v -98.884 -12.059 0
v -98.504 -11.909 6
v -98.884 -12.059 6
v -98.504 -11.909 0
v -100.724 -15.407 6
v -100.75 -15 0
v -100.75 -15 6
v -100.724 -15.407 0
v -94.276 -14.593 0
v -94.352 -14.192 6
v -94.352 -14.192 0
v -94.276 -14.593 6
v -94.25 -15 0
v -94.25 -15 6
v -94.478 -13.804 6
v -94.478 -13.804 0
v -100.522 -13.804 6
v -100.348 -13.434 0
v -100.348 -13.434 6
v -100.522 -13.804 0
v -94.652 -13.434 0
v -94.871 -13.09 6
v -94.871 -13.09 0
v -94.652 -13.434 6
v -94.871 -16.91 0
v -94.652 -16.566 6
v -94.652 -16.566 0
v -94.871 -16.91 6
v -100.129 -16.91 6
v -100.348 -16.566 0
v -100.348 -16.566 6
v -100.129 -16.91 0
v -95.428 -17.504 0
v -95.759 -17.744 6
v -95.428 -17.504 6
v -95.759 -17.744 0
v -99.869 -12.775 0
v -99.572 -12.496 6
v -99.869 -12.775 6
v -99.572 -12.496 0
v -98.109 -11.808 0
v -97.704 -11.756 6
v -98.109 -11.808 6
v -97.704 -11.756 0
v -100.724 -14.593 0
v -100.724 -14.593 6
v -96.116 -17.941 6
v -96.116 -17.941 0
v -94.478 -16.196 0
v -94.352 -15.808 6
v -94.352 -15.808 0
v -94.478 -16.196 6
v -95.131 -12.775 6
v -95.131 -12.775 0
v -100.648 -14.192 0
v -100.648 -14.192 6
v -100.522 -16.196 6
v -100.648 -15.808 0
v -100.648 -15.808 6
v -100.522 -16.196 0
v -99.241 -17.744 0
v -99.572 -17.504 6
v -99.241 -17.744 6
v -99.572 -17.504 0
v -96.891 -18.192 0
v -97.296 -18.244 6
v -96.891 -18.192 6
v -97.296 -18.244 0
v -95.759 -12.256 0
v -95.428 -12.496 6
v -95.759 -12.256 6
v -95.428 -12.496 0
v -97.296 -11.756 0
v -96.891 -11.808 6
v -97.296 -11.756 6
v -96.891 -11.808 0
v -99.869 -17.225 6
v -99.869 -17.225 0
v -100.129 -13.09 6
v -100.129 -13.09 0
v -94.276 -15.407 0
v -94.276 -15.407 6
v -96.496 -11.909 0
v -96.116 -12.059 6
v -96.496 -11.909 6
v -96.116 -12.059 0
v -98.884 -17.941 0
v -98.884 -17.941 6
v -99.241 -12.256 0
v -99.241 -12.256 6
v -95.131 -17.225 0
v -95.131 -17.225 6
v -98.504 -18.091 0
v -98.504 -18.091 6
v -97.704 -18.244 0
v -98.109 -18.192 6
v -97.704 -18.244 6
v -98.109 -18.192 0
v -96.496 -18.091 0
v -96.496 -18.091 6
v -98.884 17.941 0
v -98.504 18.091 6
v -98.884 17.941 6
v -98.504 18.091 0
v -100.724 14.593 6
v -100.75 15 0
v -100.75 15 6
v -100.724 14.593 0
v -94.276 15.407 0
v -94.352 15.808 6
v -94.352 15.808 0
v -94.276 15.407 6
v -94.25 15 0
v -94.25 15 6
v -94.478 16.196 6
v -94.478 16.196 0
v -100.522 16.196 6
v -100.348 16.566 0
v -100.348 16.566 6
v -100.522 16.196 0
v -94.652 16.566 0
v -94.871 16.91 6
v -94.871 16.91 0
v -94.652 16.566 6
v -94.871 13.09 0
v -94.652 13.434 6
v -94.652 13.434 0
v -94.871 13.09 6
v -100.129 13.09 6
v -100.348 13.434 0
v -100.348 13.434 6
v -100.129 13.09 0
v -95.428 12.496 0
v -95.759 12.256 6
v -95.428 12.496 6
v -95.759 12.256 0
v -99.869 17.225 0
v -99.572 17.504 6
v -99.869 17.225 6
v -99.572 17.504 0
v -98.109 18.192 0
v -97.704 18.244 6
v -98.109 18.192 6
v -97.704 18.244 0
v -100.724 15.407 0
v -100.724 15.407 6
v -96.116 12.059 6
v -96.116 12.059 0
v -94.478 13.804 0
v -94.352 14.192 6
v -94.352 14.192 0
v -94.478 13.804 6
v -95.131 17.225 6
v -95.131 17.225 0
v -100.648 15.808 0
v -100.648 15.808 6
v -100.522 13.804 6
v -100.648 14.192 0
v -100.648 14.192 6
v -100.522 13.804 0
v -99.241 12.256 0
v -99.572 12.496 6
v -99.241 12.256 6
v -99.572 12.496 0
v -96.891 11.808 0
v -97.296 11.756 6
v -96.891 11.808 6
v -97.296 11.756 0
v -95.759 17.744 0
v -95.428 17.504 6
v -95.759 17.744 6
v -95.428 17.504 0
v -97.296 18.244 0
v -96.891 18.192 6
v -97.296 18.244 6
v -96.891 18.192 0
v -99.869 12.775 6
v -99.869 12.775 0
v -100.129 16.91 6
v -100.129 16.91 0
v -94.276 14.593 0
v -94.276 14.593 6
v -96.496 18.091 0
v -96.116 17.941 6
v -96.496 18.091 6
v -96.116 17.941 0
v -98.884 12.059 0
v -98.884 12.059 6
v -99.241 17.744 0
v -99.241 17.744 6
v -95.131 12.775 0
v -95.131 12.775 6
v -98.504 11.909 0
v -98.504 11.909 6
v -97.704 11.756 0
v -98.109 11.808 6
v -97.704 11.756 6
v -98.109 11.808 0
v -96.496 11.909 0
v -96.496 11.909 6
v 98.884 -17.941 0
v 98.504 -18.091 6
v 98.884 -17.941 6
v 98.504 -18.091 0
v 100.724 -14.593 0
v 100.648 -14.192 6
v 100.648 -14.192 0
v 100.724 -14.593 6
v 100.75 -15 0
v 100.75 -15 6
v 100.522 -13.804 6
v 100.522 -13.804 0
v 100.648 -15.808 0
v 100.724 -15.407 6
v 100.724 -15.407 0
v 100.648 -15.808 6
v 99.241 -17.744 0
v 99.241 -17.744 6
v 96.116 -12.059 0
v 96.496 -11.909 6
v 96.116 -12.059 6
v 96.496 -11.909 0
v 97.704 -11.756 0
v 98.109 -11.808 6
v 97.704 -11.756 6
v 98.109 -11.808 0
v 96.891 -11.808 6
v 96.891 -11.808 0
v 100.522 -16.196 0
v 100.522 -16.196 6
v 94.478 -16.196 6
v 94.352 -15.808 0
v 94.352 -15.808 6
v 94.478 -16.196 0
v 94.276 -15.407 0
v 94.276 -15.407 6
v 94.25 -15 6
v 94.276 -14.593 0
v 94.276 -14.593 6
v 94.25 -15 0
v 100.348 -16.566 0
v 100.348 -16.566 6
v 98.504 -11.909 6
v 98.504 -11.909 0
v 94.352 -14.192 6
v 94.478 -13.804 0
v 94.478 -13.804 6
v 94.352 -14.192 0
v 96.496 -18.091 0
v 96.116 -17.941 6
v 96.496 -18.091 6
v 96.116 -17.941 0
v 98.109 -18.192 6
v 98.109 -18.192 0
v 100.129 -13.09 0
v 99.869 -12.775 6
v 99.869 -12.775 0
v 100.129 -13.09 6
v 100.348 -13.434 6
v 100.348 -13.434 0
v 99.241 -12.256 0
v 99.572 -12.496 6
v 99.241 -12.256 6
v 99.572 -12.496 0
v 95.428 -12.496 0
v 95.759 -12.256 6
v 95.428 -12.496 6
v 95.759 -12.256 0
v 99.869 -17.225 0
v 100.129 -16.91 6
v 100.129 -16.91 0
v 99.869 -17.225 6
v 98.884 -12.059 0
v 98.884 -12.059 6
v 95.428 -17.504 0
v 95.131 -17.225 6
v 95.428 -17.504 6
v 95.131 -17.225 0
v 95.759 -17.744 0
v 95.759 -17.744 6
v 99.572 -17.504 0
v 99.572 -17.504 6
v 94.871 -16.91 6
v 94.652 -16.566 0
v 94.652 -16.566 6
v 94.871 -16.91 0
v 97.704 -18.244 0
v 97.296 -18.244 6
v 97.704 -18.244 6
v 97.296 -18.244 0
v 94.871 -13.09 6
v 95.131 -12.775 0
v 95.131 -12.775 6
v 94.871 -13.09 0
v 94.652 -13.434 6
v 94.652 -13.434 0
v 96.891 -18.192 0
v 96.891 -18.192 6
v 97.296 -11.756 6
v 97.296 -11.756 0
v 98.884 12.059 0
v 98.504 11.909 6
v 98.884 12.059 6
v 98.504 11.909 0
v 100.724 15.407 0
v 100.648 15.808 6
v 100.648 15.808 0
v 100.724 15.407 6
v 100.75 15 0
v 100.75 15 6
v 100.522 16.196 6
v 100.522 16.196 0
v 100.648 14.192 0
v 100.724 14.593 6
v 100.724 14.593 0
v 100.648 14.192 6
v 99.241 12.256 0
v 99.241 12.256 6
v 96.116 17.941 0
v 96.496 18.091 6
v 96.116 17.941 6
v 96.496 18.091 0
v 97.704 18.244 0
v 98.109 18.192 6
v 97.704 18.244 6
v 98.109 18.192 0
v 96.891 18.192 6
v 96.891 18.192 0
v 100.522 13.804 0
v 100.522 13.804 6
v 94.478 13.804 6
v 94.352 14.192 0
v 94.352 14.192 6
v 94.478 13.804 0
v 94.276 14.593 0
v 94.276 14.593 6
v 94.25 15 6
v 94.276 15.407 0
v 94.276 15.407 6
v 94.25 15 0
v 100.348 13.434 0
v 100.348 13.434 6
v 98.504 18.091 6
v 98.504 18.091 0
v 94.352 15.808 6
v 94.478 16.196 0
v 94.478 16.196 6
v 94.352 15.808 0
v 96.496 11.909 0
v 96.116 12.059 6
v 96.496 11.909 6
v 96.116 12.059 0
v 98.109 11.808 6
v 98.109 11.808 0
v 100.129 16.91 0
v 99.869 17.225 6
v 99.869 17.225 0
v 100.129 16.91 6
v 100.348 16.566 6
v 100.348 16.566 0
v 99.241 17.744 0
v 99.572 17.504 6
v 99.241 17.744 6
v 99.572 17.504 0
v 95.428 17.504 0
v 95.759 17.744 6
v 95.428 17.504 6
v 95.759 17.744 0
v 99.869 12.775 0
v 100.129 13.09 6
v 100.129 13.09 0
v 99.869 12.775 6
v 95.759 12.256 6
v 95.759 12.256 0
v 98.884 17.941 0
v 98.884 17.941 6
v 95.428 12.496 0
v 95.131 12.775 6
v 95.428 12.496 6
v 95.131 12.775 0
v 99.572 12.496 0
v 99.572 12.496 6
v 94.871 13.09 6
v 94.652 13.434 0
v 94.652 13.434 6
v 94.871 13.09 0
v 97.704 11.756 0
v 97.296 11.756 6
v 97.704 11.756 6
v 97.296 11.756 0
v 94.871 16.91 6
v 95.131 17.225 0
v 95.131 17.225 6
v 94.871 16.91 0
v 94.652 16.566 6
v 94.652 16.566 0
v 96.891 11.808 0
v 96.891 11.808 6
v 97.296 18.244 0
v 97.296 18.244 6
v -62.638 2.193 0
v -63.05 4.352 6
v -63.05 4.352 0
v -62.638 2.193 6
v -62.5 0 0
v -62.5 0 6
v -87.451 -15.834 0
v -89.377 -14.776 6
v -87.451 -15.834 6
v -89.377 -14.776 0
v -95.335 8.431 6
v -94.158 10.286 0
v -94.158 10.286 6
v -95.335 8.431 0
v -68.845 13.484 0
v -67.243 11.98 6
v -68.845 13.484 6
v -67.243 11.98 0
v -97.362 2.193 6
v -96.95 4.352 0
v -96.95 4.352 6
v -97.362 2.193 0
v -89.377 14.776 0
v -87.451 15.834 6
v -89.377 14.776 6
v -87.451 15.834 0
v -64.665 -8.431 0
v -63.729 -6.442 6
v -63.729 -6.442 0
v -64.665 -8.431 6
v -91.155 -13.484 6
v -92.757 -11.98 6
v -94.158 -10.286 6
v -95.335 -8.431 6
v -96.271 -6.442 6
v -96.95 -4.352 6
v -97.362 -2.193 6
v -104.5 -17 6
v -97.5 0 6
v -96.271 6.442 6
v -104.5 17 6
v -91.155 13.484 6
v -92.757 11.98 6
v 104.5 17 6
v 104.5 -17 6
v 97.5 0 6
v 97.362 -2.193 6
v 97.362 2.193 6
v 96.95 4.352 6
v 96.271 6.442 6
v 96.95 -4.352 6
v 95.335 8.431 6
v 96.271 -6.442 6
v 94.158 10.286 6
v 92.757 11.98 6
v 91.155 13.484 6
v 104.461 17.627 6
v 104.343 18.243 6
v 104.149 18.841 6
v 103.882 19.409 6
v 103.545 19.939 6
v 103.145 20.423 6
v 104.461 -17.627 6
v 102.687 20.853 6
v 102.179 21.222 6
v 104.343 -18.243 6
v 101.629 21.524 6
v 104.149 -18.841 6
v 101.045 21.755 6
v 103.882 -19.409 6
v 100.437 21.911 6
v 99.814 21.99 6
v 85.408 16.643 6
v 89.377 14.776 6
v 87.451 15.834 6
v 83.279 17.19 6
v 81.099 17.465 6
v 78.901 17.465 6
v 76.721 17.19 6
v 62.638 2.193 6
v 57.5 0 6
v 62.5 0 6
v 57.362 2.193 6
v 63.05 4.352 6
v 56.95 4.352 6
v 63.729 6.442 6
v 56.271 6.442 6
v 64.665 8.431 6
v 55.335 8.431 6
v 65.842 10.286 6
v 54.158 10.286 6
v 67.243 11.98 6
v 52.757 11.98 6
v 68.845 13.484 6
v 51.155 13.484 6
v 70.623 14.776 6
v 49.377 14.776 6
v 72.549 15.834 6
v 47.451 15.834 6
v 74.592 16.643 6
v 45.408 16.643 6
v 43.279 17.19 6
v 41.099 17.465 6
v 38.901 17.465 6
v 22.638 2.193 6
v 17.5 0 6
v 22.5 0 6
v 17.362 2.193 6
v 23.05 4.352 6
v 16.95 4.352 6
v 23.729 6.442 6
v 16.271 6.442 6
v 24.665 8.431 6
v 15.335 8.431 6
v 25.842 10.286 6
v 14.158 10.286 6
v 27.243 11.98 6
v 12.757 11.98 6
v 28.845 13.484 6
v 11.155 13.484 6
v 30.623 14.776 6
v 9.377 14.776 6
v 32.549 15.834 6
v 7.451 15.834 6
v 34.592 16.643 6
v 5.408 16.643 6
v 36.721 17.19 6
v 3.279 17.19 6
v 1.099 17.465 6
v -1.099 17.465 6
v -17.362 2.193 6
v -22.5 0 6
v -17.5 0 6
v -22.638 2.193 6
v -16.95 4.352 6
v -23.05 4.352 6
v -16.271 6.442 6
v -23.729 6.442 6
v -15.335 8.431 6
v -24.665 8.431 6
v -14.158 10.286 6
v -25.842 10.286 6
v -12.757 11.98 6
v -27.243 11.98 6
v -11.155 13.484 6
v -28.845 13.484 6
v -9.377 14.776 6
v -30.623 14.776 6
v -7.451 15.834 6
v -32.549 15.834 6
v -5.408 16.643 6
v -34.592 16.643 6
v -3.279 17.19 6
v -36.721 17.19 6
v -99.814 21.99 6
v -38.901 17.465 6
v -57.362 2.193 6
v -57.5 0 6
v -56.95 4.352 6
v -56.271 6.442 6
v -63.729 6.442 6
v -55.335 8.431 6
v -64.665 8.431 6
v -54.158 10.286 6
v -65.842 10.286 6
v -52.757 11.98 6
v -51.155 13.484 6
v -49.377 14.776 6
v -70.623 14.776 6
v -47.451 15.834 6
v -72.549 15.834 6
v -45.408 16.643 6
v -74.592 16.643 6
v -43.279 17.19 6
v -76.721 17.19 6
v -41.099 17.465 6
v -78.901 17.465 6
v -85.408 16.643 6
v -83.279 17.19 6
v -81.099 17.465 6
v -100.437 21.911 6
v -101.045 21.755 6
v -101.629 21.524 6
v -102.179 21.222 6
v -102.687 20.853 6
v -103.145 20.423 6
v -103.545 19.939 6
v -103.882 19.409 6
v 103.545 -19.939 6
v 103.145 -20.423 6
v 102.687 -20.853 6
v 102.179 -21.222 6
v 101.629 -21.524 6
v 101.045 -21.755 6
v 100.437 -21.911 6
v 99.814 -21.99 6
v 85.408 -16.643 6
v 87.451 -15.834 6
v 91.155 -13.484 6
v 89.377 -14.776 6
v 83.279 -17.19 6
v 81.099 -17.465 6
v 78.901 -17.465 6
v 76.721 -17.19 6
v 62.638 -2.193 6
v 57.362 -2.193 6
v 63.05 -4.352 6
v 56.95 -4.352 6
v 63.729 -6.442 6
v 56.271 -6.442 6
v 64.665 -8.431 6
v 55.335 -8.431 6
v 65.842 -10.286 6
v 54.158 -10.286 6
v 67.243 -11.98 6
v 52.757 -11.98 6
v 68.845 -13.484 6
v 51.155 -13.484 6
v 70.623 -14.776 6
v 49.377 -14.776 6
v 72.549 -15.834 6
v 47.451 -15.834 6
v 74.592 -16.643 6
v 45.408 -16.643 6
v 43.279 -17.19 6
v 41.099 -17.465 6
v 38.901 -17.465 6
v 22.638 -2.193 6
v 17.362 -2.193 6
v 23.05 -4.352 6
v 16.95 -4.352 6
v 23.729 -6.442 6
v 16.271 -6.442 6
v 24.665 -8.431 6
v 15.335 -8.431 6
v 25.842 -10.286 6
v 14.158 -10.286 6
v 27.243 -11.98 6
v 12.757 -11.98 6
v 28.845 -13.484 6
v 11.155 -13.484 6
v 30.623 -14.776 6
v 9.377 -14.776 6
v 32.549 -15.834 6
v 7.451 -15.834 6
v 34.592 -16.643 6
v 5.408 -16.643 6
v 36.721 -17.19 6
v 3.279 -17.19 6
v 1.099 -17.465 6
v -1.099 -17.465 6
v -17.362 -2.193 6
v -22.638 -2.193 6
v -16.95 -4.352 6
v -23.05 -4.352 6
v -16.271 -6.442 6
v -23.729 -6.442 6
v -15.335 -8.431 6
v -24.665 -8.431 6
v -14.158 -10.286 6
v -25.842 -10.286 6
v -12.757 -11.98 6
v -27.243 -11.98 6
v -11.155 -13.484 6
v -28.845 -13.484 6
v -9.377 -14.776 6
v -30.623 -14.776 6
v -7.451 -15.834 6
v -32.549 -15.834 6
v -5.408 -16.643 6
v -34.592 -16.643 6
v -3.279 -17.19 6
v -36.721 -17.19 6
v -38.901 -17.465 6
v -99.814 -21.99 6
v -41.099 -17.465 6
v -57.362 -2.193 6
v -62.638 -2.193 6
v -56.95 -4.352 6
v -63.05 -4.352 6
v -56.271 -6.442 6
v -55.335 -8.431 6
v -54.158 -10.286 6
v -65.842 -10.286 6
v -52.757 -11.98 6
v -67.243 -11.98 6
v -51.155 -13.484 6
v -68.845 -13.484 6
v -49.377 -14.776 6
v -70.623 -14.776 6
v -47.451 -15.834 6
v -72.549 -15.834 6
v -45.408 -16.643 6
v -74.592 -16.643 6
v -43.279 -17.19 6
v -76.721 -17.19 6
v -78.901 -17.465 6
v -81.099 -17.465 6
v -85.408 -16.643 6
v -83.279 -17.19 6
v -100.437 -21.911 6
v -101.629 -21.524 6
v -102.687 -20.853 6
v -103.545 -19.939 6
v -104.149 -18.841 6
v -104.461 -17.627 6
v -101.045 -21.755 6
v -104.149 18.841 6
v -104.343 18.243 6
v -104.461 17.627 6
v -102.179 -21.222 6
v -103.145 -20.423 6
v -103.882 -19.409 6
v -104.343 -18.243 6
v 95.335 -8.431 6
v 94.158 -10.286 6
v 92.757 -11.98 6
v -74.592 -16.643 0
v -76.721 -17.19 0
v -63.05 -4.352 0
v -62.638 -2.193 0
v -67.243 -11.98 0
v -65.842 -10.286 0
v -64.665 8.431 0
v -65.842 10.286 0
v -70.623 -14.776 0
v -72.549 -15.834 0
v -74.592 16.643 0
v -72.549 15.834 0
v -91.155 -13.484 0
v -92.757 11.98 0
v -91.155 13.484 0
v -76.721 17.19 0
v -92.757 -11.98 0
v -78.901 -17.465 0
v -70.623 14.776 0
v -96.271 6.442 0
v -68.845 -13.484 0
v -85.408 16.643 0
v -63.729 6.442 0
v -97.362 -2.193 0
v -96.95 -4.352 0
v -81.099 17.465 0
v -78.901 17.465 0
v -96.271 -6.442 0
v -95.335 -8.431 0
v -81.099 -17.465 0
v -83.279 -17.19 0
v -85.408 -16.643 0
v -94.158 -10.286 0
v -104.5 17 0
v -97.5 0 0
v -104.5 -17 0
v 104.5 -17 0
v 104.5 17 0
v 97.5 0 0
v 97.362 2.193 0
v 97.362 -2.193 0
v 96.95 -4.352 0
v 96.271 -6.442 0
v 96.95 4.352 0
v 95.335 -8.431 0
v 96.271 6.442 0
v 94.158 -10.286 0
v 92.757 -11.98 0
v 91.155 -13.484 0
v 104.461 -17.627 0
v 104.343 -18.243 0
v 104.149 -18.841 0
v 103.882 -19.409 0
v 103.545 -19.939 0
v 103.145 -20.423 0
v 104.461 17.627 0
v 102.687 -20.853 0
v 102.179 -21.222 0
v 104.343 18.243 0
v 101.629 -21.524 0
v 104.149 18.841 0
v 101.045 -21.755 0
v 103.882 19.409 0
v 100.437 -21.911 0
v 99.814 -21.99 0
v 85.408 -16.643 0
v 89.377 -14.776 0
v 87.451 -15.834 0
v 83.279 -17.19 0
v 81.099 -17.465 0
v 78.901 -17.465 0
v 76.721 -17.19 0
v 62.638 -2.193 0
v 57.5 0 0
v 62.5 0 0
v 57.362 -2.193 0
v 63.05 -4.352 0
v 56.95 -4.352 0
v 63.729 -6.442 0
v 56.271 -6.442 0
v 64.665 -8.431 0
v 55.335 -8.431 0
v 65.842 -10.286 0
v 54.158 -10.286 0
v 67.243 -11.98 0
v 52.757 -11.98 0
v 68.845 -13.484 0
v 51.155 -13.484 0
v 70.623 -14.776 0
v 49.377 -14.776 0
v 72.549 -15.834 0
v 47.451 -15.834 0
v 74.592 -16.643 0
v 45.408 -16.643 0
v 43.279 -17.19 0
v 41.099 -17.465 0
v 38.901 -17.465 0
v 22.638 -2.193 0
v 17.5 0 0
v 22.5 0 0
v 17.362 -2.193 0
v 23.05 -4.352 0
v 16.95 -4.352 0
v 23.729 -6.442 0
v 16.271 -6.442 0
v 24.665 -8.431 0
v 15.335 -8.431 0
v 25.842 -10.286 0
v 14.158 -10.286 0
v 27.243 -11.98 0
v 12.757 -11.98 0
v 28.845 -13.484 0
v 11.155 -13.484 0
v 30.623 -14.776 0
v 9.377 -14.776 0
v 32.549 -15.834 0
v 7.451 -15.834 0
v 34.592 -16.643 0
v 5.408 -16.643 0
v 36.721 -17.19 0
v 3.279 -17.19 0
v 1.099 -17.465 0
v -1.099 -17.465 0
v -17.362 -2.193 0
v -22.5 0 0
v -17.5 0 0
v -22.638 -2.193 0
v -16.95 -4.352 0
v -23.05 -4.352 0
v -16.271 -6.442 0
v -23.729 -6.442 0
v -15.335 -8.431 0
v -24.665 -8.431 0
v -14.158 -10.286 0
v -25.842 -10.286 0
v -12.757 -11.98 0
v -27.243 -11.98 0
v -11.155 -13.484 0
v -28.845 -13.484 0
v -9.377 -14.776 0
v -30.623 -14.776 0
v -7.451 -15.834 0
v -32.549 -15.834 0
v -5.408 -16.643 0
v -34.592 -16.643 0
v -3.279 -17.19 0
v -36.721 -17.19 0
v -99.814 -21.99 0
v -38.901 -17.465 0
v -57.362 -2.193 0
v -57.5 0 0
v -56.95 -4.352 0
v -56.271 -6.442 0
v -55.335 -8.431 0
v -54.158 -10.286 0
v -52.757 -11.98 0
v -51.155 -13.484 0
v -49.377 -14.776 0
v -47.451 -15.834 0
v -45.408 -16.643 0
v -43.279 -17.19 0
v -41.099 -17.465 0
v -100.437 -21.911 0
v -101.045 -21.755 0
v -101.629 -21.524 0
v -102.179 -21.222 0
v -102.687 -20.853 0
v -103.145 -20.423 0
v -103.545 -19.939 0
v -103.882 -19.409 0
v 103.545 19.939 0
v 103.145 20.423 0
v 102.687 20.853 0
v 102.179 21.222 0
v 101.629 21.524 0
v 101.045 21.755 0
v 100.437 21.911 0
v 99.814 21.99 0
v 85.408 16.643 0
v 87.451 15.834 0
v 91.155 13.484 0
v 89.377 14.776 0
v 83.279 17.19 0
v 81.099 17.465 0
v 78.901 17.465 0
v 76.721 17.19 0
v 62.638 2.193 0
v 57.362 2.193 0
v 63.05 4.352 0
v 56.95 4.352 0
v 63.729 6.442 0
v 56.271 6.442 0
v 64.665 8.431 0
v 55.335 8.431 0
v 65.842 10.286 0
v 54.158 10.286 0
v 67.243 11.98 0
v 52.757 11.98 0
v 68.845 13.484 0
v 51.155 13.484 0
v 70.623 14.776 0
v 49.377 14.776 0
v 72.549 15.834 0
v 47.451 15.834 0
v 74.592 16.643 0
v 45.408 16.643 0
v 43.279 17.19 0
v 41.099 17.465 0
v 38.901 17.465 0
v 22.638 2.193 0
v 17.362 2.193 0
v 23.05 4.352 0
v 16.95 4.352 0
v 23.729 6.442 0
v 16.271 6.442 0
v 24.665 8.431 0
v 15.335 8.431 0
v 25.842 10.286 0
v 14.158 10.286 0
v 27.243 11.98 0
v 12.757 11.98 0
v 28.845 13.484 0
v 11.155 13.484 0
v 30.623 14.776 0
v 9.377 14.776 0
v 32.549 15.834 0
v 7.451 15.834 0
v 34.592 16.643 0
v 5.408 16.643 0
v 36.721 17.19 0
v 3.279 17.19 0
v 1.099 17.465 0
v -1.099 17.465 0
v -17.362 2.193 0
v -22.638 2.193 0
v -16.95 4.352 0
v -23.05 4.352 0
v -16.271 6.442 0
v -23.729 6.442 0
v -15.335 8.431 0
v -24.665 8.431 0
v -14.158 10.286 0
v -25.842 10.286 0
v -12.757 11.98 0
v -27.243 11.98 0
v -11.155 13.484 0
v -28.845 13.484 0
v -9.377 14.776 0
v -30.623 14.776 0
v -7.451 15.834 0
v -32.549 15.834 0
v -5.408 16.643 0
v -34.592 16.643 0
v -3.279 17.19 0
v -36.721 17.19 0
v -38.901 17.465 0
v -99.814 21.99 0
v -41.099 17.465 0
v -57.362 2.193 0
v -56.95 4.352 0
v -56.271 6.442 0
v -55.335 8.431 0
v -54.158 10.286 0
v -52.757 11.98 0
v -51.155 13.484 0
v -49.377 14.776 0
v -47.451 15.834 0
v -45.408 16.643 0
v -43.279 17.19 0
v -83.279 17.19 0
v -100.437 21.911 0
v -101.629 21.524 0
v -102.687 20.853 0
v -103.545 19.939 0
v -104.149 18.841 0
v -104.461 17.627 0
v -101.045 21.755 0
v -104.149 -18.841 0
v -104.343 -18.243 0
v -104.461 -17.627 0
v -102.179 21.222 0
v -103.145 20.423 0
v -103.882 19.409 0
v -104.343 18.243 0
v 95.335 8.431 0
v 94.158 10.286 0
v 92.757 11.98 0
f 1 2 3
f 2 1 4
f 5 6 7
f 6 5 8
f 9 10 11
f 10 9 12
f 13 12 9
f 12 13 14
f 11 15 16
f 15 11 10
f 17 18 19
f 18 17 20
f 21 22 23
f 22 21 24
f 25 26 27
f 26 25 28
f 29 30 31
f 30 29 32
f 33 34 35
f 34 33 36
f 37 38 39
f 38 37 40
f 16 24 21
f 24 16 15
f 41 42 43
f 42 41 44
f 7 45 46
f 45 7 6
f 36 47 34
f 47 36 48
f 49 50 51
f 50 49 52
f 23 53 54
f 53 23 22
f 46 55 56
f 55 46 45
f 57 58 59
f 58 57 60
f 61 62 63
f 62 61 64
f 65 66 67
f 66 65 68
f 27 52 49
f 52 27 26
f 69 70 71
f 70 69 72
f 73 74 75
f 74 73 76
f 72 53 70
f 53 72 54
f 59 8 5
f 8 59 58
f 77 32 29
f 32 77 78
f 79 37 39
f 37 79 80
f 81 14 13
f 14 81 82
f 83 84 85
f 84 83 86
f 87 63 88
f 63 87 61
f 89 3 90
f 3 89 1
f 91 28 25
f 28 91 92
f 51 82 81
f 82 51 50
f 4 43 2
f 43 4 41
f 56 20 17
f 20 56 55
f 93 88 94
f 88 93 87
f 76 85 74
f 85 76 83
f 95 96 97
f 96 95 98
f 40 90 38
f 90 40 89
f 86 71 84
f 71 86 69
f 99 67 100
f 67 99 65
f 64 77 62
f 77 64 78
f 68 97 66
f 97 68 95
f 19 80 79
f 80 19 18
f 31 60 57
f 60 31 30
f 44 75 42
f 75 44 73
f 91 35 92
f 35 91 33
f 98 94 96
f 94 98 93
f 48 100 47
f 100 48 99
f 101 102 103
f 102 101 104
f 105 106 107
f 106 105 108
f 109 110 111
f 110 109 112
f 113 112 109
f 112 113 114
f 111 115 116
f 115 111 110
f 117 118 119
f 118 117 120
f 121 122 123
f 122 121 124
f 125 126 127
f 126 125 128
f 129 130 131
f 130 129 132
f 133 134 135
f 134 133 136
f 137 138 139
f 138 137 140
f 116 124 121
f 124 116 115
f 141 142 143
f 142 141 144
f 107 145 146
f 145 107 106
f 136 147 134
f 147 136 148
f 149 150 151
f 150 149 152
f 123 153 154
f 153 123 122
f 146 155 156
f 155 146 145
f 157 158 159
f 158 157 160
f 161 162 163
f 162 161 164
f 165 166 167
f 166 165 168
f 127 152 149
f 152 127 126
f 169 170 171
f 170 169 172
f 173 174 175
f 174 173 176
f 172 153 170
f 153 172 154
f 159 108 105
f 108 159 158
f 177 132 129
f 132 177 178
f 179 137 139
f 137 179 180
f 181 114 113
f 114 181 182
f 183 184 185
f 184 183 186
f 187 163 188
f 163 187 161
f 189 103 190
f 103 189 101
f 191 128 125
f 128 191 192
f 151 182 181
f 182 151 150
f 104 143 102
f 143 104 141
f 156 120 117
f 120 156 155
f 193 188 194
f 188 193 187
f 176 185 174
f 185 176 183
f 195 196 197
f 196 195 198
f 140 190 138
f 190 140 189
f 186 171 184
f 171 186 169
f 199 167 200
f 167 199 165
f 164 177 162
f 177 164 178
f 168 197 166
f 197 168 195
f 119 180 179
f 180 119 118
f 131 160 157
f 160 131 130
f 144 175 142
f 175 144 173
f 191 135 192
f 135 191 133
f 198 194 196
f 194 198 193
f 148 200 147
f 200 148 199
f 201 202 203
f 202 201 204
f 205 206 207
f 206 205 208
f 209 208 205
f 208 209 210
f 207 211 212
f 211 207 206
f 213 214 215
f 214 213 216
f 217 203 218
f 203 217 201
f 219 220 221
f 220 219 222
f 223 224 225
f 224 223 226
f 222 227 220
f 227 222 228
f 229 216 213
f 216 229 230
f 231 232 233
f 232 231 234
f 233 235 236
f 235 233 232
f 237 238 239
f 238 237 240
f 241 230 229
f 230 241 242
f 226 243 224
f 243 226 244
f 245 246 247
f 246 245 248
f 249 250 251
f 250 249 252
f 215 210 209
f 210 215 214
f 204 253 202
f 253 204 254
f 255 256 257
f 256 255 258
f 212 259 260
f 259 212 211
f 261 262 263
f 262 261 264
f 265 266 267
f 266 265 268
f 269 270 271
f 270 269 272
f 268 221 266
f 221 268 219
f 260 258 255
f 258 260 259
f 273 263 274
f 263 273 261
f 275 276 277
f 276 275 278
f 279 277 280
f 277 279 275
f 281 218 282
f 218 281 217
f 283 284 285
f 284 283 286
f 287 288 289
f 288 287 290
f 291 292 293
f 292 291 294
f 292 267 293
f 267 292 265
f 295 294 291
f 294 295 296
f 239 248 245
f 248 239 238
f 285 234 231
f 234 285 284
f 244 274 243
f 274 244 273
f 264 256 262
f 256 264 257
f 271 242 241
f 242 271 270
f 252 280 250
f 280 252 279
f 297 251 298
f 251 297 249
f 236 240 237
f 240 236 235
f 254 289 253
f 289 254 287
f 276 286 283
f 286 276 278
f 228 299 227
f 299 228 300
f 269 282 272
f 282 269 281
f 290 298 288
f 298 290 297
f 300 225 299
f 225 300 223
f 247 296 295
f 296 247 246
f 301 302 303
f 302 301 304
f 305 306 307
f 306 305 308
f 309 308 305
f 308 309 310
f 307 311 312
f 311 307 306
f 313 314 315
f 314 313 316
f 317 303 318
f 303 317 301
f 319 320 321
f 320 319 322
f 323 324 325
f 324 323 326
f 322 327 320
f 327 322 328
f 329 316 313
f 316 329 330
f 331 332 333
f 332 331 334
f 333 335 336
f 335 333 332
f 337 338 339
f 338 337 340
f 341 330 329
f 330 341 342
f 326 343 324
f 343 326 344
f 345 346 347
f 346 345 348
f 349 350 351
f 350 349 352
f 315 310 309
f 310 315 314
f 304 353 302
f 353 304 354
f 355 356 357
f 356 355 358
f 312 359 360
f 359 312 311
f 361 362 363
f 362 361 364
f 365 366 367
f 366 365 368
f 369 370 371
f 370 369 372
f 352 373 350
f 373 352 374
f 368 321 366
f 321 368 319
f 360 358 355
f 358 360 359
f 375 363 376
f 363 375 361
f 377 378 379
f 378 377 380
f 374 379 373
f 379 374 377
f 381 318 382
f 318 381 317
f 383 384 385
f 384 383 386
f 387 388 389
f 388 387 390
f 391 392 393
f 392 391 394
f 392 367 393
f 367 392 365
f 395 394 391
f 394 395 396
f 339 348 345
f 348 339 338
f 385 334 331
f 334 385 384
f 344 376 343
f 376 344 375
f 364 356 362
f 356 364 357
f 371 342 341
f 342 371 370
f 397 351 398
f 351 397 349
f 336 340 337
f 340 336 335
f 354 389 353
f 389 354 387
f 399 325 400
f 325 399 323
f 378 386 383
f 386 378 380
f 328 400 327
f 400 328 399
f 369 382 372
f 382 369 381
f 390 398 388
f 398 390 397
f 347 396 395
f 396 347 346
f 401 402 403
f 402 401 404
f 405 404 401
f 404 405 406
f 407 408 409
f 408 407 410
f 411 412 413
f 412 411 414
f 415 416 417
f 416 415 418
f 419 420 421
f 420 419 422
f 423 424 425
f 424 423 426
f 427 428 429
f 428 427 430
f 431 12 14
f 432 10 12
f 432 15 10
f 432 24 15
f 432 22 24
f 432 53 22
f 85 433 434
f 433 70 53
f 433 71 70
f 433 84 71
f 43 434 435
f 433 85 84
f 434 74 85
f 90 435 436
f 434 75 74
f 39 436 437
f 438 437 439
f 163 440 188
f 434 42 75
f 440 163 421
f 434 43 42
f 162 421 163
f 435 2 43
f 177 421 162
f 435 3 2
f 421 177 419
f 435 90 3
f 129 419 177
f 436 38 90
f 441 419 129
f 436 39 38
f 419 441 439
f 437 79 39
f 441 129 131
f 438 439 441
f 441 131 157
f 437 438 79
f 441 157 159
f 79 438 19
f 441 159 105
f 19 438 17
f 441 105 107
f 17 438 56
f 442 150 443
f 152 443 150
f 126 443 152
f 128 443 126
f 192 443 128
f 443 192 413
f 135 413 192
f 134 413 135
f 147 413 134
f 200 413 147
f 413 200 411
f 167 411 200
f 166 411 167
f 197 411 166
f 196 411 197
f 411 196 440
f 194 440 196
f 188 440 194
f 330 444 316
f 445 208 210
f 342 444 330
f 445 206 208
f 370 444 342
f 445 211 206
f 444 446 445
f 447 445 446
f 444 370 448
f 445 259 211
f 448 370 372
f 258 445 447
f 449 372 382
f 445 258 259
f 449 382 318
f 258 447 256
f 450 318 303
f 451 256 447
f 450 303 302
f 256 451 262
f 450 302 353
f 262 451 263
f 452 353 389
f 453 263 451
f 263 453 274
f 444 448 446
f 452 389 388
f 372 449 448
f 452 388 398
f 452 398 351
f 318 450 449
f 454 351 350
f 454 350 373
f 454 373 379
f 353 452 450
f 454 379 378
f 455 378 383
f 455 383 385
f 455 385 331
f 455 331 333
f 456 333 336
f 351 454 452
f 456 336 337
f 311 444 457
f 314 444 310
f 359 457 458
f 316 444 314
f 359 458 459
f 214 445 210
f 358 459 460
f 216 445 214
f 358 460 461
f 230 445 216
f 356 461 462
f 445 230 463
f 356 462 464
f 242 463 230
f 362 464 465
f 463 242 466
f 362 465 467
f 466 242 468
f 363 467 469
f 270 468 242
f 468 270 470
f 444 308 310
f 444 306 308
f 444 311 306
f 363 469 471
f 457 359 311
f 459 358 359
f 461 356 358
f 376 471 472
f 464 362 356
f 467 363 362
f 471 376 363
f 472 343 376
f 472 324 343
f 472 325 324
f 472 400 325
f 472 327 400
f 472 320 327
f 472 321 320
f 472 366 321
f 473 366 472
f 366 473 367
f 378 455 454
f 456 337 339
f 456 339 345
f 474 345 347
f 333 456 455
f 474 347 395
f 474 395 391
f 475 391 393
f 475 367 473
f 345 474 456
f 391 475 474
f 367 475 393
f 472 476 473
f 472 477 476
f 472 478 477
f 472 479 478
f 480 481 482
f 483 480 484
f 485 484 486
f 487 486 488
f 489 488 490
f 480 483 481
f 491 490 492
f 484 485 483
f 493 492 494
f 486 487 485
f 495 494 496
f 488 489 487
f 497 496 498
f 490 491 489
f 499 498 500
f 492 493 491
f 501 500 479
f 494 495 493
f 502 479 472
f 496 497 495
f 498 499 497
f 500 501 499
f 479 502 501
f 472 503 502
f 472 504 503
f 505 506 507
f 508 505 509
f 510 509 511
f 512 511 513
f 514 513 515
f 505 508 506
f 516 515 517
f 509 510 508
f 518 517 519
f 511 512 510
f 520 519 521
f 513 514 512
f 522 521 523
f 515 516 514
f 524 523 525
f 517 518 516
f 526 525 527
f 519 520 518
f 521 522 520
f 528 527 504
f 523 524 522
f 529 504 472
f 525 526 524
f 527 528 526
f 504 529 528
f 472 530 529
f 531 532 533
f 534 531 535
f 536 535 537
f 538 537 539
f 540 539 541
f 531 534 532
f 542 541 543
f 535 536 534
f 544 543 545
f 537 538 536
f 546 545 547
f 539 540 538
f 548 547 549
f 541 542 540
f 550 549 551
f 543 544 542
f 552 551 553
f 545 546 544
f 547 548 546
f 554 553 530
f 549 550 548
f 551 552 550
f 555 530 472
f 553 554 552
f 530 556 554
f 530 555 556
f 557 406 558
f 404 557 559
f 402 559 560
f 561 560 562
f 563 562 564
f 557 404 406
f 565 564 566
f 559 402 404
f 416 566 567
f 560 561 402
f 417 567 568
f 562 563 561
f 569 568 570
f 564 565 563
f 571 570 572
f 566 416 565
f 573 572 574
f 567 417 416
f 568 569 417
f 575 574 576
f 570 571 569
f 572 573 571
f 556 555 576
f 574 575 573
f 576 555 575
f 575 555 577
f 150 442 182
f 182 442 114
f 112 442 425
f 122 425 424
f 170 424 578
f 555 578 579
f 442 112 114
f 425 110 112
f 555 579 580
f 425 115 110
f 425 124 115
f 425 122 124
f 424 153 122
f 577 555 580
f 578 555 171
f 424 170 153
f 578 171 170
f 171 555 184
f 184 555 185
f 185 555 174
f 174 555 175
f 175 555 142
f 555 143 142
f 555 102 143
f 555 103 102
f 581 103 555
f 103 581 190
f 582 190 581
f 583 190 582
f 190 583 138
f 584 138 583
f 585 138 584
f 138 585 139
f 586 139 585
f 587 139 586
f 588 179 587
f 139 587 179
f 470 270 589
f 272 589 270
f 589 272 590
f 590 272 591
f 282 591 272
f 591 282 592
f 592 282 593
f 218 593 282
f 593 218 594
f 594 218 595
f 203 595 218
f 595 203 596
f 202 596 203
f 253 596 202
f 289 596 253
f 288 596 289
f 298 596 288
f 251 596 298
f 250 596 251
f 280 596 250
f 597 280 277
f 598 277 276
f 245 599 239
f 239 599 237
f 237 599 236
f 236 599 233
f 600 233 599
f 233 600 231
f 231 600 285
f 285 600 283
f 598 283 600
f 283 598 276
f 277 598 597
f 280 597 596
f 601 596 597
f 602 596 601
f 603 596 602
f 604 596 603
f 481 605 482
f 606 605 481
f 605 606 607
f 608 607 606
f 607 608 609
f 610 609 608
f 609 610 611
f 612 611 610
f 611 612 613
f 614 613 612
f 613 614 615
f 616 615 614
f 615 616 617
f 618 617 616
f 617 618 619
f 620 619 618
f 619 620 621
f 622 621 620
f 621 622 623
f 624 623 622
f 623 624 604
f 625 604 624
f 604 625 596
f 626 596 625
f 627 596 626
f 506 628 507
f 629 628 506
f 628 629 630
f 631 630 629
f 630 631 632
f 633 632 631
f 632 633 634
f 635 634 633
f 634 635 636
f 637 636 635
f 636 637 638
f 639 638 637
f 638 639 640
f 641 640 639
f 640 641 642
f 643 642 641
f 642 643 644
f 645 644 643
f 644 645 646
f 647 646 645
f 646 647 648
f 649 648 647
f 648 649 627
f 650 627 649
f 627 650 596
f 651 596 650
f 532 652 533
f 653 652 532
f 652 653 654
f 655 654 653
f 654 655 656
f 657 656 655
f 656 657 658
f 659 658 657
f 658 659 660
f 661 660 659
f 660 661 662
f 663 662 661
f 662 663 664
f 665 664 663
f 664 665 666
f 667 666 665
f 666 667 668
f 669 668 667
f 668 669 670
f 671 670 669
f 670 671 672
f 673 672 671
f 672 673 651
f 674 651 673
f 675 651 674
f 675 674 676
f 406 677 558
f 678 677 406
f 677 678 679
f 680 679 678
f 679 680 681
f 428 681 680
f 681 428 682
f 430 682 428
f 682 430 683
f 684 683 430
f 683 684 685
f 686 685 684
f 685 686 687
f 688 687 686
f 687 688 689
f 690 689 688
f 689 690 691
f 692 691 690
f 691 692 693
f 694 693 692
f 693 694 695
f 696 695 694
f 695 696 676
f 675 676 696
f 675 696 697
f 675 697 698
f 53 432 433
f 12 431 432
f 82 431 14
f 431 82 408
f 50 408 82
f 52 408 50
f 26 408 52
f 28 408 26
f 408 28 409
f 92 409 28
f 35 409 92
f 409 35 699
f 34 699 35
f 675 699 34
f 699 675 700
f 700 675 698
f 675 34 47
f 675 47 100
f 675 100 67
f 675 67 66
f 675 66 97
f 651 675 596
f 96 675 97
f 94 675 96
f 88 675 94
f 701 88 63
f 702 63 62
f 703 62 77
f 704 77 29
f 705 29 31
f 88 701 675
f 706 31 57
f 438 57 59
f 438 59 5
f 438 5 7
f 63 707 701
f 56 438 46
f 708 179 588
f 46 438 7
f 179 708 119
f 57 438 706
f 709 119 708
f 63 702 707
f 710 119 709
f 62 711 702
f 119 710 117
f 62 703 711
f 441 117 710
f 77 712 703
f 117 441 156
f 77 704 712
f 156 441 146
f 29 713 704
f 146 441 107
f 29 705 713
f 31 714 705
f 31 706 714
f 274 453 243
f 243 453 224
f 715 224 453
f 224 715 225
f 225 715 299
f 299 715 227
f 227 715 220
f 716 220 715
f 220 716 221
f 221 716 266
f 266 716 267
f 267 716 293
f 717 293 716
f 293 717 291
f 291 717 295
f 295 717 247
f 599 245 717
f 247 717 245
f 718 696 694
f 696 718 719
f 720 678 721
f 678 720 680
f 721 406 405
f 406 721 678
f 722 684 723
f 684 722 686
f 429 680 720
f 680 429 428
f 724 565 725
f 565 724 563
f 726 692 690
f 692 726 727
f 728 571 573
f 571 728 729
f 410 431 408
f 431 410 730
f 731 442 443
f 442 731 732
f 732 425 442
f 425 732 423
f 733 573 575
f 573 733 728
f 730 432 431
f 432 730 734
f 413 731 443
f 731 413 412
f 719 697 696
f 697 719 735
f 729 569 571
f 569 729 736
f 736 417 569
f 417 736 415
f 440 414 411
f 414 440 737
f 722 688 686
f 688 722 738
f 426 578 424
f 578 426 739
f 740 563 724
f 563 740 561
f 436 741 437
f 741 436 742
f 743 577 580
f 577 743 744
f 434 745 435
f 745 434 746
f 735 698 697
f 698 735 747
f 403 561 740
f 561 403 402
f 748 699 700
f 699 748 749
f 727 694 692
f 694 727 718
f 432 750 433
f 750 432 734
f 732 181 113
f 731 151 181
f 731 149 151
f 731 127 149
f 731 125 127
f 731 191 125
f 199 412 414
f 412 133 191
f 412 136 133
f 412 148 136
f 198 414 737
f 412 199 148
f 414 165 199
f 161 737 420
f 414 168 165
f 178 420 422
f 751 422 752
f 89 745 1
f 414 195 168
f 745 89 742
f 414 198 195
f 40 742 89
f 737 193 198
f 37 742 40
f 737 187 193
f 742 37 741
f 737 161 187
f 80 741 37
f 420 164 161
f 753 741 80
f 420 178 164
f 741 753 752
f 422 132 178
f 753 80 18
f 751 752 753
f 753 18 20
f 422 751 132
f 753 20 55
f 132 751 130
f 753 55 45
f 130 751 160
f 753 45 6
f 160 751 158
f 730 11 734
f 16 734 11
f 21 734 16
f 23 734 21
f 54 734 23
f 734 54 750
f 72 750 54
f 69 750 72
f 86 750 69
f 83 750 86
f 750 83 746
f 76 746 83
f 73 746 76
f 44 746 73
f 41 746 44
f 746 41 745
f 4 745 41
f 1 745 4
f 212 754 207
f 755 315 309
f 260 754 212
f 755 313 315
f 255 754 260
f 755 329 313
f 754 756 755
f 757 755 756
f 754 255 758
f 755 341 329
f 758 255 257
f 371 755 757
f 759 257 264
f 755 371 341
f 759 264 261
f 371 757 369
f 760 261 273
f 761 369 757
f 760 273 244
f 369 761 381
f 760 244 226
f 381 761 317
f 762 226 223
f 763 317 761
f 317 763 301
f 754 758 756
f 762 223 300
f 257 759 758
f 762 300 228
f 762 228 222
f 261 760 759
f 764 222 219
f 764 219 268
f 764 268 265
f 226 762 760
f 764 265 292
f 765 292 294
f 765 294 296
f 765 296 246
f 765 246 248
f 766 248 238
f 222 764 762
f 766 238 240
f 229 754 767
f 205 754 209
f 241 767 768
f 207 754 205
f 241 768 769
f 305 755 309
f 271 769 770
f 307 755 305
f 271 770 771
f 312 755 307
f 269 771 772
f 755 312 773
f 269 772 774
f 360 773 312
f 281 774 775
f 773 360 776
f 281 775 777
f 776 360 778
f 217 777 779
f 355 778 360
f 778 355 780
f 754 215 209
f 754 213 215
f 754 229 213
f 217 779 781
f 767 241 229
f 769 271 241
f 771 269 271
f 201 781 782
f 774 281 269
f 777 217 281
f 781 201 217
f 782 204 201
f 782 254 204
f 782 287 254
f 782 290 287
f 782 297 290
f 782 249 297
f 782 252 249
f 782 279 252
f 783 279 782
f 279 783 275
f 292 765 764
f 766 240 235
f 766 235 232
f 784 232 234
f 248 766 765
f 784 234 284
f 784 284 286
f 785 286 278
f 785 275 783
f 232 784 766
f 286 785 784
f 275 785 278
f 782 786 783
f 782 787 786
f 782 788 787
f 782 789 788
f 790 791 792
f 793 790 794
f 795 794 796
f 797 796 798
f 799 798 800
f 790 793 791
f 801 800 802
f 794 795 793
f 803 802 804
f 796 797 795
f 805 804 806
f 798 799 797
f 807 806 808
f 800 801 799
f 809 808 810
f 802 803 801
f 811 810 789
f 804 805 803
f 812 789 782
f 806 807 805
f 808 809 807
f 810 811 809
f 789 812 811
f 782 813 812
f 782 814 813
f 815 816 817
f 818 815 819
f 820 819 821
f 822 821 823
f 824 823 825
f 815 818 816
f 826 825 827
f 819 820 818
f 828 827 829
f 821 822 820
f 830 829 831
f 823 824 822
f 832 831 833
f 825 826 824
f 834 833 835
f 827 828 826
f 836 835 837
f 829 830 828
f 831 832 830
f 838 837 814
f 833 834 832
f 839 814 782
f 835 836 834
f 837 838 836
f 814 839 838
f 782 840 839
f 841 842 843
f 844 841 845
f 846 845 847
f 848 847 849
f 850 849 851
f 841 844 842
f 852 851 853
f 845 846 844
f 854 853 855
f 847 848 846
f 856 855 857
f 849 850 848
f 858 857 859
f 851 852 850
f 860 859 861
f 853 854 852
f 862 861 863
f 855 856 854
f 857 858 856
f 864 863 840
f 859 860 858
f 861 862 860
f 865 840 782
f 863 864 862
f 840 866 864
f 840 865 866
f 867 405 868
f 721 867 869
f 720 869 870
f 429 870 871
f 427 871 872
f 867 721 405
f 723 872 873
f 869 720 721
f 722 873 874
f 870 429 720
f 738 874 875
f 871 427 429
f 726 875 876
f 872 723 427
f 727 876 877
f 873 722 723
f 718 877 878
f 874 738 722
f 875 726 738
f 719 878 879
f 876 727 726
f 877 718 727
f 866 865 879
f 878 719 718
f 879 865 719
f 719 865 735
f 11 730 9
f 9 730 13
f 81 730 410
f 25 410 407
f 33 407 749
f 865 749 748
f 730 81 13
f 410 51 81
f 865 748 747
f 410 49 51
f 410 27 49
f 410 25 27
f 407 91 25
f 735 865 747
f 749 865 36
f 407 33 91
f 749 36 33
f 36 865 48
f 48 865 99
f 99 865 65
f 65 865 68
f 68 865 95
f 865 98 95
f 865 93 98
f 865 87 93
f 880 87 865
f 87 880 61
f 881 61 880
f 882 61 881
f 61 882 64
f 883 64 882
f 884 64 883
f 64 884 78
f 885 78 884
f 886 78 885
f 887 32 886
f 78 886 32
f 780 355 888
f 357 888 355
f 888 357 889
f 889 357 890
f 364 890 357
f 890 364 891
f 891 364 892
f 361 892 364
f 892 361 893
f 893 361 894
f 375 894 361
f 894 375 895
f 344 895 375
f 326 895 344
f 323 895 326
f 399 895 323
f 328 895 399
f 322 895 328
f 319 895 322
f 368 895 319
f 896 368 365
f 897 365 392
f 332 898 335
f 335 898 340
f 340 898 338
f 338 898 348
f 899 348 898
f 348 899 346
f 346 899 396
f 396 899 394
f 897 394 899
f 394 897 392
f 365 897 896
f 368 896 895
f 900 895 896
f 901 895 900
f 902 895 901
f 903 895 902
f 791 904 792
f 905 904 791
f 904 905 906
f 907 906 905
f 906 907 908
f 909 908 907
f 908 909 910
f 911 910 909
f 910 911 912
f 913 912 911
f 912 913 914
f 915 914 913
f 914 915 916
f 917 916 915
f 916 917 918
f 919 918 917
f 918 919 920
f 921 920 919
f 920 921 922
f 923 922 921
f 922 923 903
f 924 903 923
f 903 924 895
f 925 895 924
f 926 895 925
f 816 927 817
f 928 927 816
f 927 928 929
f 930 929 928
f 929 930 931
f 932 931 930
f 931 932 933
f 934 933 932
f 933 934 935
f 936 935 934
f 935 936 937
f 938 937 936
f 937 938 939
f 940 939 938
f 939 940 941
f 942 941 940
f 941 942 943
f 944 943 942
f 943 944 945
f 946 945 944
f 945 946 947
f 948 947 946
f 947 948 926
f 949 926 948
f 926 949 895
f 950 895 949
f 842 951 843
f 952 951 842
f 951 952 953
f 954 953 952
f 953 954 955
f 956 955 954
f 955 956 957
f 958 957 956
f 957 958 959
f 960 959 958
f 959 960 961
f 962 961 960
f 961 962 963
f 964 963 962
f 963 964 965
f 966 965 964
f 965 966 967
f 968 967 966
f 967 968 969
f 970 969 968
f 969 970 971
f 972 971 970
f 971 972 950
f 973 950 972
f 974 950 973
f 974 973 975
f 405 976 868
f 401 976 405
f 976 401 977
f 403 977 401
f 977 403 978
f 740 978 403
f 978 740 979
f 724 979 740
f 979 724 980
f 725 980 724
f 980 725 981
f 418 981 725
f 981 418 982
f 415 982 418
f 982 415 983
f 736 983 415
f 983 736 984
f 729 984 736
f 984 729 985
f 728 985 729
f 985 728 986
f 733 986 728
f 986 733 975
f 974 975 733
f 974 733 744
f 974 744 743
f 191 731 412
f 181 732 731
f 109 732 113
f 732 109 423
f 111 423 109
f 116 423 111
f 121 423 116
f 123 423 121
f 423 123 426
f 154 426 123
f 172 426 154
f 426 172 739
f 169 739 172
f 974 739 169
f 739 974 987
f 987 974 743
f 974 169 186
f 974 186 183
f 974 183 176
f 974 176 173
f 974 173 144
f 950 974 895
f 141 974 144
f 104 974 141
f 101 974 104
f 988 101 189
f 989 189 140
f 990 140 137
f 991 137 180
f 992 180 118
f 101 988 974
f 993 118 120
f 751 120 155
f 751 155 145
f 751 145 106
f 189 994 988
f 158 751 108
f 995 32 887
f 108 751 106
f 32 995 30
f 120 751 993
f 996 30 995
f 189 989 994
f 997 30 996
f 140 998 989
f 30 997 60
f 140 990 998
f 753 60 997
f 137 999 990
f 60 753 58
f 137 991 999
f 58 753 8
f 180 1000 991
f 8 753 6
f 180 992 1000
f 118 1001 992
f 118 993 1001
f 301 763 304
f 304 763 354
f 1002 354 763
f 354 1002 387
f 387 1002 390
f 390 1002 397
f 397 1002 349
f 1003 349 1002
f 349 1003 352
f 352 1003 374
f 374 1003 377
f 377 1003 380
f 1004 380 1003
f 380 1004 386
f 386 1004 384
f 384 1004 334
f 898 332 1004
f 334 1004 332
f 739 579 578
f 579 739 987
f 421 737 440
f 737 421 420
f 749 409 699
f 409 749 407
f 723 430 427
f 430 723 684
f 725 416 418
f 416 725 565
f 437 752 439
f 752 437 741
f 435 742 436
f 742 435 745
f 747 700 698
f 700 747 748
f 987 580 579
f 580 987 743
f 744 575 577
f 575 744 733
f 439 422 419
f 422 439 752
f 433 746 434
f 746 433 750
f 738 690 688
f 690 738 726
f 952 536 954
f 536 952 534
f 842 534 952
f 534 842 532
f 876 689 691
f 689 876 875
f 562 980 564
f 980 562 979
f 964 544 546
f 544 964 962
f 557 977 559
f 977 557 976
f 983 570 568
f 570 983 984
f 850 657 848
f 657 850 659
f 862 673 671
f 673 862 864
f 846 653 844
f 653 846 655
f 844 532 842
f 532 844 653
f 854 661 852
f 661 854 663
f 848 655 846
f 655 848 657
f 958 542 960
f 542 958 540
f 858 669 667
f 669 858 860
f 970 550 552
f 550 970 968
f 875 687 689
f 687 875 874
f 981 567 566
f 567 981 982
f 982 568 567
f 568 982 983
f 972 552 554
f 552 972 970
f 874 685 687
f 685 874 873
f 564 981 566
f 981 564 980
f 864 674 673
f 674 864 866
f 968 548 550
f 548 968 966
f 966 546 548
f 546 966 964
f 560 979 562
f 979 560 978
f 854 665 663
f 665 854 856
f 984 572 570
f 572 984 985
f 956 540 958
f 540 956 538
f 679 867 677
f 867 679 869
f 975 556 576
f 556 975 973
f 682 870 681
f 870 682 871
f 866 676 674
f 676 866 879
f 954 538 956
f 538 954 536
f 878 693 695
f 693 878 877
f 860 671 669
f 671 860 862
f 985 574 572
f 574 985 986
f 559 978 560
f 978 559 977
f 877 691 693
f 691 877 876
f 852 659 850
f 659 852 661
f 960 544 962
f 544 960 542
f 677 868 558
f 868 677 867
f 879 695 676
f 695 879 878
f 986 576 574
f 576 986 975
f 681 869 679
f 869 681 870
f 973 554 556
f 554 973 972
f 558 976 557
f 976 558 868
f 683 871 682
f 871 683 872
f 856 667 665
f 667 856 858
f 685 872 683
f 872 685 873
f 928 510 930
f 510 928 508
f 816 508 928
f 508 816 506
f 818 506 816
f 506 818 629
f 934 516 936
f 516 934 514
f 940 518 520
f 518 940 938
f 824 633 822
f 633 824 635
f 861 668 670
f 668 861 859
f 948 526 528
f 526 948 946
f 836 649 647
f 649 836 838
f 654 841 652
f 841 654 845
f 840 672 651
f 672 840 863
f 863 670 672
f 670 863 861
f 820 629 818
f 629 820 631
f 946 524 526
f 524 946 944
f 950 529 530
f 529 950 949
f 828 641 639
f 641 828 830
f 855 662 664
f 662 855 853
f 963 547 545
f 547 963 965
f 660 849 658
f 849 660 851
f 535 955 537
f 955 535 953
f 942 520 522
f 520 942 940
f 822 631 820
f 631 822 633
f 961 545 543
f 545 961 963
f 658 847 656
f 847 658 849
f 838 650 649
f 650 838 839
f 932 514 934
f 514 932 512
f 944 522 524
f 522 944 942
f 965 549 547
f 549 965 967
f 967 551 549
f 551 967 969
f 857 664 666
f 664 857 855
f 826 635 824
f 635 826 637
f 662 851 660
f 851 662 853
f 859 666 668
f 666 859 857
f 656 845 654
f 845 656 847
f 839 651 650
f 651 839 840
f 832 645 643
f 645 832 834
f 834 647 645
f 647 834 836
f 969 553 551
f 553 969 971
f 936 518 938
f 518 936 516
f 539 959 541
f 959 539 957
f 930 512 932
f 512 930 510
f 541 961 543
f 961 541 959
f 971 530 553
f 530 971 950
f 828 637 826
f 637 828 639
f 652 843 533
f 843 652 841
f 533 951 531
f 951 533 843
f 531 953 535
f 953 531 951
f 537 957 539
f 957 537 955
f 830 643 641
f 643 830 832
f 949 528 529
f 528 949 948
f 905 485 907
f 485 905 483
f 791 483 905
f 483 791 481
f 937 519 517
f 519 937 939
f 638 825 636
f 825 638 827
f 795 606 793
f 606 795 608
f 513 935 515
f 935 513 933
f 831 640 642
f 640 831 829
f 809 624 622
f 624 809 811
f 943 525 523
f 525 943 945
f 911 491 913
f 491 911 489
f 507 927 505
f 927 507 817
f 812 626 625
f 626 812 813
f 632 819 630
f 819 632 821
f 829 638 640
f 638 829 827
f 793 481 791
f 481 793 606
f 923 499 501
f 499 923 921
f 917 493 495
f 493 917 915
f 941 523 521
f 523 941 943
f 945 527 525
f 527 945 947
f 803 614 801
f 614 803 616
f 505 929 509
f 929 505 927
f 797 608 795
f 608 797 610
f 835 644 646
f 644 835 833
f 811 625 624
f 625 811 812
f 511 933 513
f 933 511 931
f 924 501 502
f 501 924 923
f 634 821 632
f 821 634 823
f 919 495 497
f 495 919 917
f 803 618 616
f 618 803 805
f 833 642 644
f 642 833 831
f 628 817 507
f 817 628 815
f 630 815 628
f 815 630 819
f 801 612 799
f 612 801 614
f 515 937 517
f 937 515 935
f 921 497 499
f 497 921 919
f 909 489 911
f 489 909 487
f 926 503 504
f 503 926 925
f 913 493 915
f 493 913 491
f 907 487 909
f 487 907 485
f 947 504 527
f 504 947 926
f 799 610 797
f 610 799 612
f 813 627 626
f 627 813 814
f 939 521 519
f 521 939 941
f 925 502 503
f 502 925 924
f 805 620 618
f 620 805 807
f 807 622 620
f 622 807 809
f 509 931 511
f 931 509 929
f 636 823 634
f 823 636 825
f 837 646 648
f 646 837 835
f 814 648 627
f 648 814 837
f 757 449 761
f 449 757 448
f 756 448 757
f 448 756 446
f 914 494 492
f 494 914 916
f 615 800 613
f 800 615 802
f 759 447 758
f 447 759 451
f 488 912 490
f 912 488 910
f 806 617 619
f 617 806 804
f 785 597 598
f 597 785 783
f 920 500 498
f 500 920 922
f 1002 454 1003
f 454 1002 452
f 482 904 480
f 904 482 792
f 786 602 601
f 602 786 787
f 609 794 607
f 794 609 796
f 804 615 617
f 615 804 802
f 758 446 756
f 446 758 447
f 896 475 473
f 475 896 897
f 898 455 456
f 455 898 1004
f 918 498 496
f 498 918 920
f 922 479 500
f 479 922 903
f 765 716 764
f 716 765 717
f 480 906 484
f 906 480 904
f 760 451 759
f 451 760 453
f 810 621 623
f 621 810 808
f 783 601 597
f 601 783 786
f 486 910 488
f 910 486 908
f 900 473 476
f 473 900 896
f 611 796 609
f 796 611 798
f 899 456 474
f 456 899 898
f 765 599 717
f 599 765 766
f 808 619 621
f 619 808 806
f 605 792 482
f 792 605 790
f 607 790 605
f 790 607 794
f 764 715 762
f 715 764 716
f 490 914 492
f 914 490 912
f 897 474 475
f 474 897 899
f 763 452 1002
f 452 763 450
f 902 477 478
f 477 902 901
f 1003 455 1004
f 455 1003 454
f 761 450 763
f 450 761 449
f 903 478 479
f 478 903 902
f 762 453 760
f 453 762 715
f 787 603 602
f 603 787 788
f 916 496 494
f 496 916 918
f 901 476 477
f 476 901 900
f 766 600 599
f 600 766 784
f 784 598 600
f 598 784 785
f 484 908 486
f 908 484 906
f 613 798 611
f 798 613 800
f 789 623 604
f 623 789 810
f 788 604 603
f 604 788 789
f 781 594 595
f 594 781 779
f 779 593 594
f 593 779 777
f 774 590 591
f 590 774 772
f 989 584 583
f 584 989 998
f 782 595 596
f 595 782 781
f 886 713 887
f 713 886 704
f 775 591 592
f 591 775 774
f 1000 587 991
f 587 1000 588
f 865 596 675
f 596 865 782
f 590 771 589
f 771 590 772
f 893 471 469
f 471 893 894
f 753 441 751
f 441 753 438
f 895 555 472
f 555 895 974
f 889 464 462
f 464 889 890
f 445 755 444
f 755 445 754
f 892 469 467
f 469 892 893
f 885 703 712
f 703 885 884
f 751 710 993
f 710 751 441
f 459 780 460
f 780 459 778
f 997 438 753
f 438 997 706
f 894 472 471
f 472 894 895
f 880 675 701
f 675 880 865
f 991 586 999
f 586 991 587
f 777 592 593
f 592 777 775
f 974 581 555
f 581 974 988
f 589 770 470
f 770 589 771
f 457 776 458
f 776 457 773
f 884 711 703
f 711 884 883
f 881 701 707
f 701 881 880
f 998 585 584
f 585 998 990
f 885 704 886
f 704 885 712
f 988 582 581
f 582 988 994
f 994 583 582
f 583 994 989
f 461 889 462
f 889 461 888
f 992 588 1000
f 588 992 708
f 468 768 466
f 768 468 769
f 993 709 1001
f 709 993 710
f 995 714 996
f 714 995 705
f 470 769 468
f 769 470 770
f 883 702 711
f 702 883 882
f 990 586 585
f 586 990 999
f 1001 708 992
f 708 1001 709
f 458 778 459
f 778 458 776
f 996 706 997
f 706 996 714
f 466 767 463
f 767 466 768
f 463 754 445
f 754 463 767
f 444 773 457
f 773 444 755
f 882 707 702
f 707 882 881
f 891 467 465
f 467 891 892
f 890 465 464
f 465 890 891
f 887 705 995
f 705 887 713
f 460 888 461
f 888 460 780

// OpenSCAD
$fn = 50;

difference() {
	union() {
		hull() {
			translate(v = [-99.5, 17.0, 0]) {
				cylinder(h = 6, r = 5);
			}
			translate(v = [99.5, 17.0, 0]) {
				cylinder(h = 6, r = 5);
			}
			translate(v = [-99.5, -17.0, 0]) {
				cylinder(h = 6, r = 5);
			}
			translate(v = [99.5, -17.0, 0]) {
				cylinder(h = 6, r = 5);
			}
		}
	}
	union() {
		translate(v = [-97.5, -15.0, -100.0]) {
			cylinder(h = 200, r = 3.25);
		}
		translate(v = [-97.5, 15.0, -100.0]) {
			cylinder(h = 200, r = 3.25);
		}
		translate(v = [97.5, -15.0, -100.0]) {
			cylinder(h = 200, r = 3.25);
		}
		translate(v = [97.5, 15.0, -100.0]) {
			cylinder(h = 200, r = 3.25);
		}
		translate(v = [-97.5, -15.0, -100.0]) {
			cylinder(h = 200, r = 1.8);
		}
		translate(v = [-97.5, 15.0, -100.0]) {
			cylinder(h = 200, r = 1.8);
		}
		translate(v = [97.5, -15.0, -100.0]) {
			cylinder(h = 200, r = 1.8);
		}
		translate(v = [97.5, 15.0, -100.0]) {
			cylinder(h = 200, r = 1.8);
		}
		translate(v = [-80.0, 0, 0.0]) {
			cylinder(h = 6, r = 17.5);
		}
		translate(v = [-40.0, 0, 0.0]) {
			cylinder(h = 6, r = 17.5);
		}
		cylinder(h = 6, r = 17.5);
		translate(v = [40.0, 0, 0.0]) {
			cylinder(h = 6, r = 17.5);
		}
		translate(v = [80.0, 0, 0.0]) {
			cylinder(h = 6, r = 17.5);
		}
	}
}
